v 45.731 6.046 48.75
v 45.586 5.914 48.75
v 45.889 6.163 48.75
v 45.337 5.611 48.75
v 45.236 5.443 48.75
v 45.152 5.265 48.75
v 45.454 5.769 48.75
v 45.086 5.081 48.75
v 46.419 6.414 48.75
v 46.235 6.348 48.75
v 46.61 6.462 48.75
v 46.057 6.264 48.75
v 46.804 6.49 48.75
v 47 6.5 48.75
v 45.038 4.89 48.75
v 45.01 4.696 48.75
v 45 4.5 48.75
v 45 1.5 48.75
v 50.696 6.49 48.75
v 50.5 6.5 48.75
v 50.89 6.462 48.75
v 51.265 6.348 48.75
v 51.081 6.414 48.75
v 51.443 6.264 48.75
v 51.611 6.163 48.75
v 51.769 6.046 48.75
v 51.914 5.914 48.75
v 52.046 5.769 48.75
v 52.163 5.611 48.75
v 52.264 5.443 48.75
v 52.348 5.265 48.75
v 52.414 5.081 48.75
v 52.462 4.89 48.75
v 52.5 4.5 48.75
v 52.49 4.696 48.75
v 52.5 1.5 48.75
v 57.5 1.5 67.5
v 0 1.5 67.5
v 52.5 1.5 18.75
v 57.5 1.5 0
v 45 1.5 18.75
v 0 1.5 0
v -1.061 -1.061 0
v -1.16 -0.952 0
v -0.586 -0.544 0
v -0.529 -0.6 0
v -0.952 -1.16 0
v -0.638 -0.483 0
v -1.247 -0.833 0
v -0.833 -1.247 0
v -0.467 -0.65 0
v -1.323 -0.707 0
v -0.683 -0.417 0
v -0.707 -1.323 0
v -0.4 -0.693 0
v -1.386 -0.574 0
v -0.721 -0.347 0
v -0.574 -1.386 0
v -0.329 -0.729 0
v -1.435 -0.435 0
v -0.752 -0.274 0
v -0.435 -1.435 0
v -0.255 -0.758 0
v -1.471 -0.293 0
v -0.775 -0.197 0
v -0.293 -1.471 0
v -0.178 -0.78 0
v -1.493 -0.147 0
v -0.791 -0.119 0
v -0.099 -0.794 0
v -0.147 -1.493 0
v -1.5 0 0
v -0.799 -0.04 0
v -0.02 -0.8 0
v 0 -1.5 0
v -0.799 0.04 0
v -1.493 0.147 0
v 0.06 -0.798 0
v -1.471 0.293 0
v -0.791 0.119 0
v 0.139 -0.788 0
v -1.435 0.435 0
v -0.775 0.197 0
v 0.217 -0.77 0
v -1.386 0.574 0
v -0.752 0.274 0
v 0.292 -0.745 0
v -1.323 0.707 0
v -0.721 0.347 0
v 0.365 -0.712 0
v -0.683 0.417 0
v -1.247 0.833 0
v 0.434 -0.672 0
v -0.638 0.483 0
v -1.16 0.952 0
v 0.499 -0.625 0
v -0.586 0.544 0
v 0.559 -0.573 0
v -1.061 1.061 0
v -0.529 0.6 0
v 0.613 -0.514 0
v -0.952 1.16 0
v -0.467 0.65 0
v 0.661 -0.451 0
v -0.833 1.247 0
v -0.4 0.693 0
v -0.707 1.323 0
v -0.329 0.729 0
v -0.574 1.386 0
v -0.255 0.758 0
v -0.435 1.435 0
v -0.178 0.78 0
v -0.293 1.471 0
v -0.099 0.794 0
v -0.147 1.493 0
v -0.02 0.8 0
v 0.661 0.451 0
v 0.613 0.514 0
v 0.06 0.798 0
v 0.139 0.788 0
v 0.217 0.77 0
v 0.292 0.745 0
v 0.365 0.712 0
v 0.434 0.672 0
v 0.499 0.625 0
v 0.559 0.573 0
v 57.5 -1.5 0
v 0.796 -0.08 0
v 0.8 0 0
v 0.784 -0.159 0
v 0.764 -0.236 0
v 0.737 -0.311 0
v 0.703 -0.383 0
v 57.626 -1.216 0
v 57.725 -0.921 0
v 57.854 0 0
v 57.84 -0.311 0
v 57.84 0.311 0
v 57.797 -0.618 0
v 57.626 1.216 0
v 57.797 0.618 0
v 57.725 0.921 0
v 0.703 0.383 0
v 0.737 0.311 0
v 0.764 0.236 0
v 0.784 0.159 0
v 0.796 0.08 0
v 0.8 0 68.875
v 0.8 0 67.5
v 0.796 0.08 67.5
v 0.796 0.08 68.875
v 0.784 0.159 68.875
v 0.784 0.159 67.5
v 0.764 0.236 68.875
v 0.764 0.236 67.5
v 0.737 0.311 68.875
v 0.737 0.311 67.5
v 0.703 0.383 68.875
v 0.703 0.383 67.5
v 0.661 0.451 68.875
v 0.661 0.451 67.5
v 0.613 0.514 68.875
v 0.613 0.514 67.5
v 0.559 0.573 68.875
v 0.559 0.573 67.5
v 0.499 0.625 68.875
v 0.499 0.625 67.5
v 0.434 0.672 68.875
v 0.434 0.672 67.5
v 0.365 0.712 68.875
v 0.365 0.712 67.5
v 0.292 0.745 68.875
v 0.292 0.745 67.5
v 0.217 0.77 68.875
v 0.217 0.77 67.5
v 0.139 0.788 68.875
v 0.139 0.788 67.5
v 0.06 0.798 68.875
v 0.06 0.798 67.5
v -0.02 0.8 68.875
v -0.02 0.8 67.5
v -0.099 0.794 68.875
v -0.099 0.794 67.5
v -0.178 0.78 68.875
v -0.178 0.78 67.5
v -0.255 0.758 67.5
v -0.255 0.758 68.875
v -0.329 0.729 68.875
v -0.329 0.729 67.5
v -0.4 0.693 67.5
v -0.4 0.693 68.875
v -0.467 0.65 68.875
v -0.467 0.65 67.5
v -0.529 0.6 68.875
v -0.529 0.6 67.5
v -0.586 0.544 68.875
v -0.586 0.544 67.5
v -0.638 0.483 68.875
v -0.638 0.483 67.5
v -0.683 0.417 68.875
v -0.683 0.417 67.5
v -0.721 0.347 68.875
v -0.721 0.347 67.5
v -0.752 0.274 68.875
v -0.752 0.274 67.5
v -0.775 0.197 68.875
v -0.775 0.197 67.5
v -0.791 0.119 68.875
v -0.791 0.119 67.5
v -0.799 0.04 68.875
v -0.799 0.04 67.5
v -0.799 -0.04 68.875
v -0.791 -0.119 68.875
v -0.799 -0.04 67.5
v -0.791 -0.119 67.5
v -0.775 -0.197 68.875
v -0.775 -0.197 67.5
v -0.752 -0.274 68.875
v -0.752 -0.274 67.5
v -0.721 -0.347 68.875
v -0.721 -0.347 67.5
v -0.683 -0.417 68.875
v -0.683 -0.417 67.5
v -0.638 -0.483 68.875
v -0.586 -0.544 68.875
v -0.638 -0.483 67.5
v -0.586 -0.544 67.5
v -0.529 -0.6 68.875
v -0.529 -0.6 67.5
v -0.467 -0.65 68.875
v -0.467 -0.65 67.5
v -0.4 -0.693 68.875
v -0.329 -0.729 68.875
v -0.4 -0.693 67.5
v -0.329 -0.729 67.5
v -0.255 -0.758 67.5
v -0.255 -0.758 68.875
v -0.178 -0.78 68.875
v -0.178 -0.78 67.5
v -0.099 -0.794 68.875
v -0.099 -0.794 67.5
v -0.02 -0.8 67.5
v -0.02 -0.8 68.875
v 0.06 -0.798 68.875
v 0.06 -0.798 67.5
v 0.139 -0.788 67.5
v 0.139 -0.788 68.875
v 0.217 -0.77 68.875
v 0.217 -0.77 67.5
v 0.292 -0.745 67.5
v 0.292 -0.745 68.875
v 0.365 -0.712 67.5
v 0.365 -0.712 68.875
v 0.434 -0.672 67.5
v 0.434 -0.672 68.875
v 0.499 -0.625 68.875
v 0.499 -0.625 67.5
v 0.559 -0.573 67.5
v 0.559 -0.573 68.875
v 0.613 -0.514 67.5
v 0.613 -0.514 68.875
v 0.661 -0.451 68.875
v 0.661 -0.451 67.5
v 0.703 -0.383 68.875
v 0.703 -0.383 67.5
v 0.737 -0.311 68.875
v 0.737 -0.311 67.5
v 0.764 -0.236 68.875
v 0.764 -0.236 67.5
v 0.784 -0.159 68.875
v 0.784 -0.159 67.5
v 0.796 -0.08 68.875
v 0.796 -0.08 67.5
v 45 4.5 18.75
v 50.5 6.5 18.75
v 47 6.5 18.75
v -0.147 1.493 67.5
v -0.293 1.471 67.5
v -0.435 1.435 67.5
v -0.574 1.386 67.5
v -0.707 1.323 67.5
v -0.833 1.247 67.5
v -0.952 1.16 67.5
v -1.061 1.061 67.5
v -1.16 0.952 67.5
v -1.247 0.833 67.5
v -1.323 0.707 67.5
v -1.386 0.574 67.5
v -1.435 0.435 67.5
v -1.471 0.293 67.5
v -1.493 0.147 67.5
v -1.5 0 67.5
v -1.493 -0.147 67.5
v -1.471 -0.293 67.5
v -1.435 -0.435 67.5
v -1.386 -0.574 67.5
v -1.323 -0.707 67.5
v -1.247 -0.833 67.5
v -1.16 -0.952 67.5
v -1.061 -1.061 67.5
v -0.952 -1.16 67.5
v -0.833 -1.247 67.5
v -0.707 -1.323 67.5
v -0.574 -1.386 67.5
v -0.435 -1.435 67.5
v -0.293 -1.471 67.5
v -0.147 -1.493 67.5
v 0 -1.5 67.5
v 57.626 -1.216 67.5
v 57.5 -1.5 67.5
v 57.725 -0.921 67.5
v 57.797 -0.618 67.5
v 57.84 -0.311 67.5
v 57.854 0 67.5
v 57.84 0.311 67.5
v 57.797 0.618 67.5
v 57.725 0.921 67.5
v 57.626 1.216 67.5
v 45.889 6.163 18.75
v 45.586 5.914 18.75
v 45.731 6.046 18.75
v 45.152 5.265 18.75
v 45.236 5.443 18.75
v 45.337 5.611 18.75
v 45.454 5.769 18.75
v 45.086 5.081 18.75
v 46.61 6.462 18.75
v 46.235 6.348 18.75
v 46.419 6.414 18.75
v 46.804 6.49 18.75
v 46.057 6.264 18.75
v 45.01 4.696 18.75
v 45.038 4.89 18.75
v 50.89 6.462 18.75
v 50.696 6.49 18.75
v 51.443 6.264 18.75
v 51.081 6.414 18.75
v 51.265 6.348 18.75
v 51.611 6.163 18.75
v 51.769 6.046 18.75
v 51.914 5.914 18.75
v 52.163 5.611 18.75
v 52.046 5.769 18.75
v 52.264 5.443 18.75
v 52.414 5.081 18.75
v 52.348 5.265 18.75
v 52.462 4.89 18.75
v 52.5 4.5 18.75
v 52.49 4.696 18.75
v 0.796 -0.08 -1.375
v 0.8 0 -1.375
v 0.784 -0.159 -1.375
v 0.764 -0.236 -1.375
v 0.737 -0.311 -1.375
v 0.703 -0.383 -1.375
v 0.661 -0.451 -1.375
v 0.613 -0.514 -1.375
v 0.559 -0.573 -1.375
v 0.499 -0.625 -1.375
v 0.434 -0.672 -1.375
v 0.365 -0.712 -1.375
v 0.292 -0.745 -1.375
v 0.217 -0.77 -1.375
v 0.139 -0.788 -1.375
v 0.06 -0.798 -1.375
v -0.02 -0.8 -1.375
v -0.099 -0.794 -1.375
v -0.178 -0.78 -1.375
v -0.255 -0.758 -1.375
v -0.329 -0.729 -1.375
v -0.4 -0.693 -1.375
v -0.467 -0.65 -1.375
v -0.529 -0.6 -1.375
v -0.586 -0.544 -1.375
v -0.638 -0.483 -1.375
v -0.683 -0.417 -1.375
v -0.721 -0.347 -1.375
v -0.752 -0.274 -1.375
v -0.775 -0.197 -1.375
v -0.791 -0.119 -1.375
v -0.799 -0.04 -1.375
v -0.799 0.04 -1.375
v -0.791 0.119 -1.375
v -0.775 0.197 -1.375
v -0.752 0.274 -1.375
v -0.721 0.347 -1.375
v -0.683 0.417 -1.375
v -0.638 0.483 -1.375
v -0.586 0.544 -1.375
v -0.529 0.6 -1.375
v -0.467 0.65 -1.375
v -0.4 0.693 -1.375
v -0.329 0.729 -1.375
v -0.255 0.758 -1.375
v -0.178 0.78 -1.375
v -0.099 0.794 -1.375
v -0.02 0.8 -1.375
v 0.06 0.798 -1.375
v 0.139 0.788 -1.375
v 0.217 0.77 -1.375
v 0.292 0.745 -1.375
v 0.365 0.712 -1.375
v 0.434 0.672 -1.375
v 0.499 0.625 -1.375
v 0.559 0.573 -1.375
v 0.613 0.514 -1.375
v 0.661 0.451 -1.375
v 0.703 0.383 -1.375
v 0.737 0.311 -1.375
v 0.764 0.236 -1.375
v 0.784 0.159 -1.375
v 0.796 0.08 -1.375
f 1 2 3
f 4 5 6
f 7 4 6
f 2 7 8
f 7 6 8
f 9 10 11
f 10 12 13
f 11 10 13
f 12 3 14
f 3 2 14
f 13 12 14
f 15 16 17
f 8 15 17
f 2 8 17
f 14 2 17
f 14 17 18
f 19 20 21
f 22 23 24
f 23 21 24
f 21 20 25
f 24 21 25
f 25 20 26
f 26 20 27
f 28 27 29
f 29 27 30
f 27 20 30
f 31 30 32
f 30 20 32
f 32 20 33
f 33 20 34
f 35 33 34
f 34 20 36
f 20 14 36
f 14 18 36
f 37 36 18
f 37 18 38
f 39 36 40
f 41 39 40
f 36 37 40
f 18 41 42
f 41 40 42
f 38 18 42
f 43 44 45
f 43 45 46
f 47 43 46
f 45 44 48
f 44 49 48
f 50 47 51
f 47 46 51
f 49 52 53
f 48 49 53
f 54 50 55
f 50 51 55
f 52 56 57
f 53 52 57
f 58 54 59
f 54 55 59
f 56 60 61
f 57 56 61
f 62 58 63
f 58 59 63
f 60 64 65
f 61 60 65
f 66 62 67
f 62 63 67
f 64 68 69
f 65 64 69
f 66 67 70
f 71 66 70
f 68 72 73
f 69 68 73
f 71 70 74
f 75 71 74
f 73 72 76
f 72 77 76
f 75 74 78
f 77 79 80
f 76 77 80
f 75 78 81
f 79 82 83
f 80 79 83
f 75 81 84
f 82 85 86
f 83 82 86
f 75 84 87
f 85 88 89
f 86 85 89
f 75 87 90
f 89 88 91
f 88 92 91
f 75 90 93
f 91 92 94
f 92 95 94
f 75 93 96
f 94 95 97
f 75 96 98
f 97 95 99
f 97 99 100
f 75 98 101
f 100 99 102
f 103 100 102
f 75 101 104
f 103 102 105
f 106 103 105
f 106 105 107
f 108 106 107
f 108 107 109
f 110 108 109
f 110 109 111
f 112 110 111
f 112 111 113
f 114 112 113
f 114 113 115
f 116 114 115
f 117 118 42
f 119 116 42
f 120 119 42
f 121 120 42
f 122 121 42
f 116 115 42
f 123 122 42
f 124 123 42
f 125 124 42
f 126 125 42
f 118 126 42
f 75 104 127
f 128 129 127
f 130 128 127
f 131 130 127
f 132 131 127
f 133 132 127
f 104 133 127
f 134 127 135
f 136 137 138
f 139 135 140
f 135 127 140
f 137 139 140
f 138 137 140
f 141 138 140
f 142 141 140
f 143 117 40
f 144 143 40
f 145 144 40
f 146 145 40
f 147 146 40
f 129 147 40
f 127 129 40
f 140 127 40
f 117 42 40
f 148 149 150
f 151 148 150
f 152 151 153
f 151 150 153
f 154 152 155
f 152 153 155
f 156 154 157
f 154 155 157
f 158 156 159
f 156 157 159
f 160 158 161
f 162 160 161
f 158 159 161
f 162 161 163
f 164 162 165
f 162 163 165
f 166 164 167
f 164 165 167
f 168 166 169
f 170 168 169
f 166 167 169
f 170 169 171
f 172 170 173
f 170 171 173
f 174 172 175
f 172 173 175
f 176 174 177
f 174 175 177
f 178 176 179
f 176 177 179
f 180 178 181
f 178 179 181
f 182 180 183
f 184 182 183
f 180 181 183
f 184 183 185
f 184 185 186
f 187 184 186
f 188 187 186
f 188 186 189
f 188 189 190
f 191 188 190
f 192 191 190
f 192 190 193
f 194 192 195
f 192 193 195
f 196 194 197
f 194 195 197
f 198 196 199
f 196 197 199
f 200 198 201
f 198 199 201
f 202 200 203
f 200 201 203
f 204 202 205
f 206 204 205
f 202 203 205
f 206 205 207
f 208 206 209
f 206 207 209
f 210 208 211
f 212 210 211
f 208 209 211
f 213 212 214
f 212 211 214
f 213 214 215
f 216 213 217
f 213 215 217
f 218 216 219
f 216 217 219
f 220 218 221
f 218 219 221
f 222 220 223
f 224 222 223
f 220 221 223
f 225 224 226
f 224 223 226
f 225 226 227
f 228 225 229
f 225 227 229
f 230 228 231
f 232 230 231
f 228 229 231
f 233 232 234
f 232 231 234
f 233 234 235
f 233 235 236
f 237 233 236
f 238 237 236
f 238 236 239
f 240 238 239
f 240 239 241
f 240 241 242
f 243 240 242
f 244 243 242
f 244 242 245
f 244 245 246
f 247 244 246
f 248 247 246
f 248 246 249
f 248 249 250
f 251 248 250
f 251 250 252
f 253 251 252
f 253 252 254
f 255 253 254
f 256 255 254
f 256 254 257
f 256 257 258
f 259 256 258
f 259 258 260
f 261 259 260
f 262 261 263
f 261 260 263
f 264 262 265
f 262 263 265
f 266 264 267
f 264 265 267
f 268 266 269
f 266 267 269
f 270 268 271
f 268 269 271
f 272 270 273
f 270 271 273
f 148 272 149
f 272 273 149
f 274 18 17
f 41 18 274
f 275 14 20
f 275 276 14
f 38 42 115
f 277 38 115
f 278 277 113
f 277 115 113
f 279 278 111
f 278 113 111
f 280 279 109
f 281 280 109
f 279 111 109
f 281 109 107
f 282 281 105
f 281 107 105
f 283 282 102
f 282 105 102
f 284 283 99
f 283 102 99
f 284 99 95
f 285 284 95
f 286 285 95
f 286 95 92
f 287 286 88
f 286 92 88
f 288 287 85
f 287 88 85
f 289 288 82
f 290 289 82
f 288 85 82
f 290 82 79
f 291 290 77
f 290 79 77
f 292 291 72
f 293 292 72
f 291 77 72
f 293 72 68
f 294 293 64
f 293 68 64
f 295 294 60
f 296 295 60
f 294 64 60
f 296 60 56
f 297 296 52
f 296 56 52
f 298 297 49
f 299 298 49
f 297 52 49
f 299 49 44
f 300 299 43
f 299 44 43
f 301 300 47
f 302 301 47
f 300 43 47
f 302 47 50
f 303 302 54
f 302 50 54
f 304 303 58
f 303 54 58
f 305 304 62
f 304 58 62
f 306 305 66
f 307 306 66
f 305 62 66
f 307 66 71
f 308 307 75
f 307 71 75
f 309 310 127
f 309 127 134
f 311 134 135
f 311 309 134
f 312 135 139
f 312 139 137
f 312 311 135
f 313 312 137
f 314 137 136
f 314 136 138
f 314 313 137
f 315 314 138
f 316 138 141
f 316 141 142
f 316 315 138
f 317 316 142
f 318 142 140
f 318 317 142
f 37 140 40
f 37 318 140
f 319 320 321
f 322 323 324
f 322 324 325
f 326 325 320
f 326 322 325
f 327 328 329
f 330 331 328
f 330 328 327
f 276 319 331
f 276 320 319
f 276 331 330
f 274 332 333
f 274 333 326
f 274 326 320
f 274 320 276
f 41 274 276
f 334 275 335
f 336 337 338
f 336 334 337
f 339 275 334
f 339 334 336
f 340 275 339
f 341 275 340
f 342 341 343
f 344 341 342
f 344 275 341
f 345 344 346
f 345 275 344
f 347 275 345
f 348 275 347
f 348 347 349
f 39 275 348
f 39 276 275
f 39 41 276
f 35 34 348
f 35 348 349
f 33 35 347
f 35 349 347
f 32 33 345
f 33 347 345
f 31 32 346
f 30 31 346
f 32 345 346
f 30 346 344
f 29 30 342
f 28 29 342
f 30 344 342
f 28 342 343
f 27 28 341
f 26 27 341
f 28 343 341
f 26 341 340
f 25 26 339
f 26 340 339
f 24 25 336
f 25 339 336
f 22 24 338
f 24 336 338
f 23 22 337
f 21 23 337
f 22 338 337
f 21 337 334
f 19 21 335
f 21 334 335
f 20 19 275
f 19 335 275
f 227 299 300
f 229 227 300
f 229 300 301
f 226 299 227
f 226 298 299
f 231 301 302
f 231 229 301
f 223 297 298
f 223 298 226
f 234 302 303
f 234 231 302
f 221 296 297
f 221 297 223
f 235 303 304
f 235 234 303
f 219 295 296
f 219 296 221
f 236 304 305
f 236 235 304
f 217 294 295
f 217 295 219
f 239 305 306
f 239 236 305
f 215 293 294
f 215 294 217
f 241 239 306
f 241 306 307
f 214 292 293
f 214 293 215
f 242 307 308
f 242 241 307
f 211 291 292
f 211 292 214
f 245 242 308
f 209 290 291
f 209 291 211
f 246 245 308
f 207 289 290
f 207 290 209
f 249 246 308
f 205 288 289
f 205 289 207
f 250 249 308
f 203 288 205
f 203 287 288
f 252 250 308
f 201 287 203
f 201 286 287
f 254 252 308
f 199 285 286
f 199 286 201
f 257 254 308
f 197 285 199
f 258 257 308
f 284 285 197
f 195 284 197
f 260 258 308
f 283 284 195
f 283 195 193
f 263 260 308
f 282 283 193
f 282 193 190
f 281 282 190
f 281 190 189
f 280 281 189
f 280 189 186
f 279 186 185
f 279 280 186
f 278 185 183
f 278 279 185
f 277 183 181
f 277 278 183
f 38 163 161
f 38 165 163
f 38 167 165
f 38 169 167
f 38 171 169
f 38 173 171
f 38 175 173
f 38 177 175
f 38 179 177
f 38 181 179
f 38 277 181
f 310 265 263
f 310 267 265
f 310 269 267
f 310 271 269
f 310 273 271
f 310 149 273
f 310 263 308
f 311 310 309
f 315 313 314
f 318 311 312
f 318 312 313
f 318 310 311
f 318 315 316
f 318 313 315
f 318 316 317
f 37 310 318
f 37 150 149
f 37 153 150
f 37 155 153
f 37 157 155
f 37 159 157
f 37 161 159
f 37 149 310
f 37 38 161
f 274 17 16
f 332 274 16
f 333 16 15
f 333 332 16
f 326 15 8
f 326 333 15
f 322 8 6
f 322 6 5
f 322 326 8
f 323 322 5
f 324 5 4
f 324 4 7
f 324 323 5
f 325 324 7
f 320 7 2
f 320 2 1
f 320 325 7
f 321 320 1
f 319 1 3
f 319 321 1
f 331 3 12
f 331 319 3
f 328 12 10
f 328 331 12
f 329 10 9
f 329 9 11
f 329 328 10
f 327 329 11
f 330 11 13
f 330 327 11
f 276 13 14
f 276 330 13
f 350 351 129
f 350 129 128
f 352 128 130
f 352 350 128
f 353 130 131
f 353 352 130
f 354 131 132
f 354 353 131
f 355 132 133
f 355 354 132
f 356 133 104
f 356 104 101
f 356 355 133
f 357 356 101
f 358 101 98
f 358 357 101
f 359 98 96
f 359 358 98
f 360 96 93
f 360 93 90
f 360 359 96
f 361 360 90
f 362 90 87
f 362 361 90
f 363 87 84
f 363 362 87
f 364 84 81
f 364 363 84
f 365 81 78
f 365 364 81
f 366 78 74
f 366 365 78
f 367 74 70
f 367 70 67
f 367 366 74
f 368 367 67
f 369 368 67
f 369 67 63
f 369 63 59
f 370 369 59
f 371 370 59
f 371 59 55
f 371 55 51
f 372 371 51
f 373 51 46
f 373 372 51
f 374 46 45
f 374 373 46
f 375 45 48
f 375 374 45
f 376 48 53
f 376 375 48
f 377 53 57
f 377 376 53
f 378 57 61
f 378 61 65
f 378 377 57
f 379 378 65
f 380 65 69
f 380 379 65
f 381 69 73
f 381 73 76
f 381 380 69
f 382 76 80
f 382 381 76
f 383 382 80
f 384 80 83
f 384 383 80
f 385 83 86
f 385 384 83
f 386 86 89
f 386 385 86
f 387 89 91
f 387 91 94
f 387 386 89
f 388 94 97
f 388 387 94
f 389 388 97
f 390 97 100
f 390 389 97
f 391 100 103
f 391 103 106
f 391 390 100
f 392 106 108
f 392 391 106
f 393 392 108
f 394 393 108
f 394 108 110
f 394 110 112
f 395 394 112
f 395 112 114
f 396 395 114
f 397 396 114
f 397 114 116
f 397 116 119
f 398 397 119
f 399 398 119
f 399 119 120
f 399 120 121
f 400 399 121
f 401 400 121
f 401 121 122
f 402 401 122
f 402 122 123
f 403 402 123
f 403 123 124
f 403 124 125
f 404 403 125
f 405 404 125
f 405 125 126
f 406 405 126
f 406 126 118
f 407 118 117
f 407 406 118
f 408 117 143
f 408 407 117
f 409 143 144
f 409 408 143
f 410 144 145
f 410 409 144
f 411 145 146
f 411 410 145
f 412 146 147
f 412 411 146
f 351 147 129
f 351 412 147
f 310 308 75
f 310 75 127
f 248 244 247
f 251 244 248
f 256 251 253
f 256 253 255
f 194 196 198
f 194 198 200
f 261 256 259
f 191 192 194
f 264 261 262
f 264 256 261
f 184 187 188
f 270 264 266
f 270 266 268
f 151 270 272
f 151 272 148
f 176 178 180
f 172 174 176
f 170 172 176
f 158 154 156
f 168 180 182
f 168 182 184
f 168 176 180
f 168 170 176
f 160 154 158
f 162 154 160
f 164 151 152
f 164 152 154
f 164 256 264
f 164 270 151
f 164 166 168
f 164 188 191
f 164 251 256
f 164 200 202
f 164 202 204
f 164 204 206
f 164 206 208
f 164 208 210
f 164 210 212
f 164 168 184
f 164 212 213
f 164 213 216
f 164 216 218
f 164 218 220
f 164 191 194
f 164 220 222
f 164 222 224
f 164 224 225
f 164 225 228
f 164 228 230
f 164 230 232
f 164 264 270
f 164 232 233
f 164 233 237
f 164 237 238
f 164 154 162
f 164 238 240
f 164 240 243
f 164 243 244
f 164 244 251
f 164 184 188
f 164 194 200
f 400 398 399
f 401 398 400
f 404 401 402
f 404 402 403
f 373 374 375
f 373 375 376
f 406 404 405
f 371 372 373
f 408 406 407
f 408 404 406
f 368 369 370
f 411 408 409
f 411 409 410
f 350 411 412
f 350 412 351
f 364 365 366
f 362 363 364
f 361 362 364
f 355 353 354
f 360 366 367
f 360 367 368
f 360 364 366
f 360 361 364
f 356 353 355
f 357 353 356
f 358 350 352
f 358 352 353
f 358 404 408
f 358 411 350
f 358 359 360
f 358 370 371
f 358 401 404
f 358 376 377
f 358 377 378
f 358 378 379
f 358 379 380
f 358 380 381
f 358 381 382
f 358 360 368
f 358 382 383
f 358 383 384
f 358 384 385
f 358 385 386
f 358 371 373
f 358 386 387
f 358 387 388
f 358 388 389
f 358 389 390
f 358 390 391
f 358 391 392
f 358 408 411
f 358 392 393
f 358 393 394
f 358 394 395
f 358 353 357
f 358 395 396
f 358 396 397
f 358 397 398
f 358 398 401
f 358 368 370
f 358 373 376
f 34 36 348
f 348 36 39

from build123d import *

# Parameters (mm, degrees)
BOSS_EXTRUDE1_DEPTH = 67.5
SKETCH2_R           = 0.8
BOSS_EXTRUDE2_DEPTH = 1.375
BOSS_EXTRUDE3_START = 1.375
SKETCH3_R           = 0.8
BOSS_EXTRUDE3_DEPTH = 1.375
BOSS_EXTRUDE4_DEPTH = 67.5
SKETCH5_W           = 7.5
SKETCH5_H           = 30
BOSS_EXTRUDE5_DEPTH = 5
FILLET1_R           = 2


with BuildPart() as part:
    # Sketch1 → Boss-Extrude1 (new body)
    with BuildSketch(Plane.XY):
        with BuildLine():
            Line((0, -1.5), (57.5, -1.5))
            Line((57.5, -1.5), (57.5, 1.5))
            Line((57.5, 1.5), (0, 1.5))
            ThreePointArc((0, 1.5), (-1.5, 0), (0, -1.5))
        make_face()
    extrude(amount=BOSS_EXTRUDE1_DEPTH)

    # Sketch2 → Boss-Extrude2 (add)
    with BuildSketch(Plane.XY.offset(67.5)):
        Circle(SKETCH2_R)
    extrude(amount=BOSS_EXTRUDE2_DEPTH)

    # Sketch3 → Boss-Extrude3 (add)
    with BuildSketch(Plane(origin=(0, 0, 0), x_dir=(-1, 0, 0), z_dir=(0, 0, -1)).offset(BOSS_EXTRUDE3_START)):
        with Locations(Location((0, 0, 0), (0, 0, 180))):
            Circle(SKETCH3_R)
    extrude(amount=-BOSS_EXTRUDE3_DEPTH)

    # Sketch4 → Boss-Extrude4 (add)
    with BuildSketch(Plane.XY.offset(67.5)):
        with BuildLine():
            Line((57.5, 1.5), (57.5, -1.5))
            ThreePointArc((57.5, -1.5), (57.854101966, 0), (57.5, 1.5))
        make_face()
    extrude(amount=-BOSS_EXTRUDE4_DEPTH)

    # Sketch5 → Boss-Extrude5 (add)
    with BuildSketch(Plane(origin=(0, 1.5, 0), x_dir=(1, 0, 0), z_dir=(0, 1, 0))):
        with Locations((48.75, -33.75)):
            Rectangle(SKETCH5_W, SKETCH5_H)
    extrude(amount=BOSS_EXTRUDE5_DEPTH)

    # Fillet1
    fillet1_edges = [part.edges().sort_by_distance(p)[0] for p in [
        (45, 6.5, 33.75),
        (52.5, 6.5, 33.75),
    ]]
    fillet(fillet1_edges, radius=FILLET1_R)


solid = part.part
